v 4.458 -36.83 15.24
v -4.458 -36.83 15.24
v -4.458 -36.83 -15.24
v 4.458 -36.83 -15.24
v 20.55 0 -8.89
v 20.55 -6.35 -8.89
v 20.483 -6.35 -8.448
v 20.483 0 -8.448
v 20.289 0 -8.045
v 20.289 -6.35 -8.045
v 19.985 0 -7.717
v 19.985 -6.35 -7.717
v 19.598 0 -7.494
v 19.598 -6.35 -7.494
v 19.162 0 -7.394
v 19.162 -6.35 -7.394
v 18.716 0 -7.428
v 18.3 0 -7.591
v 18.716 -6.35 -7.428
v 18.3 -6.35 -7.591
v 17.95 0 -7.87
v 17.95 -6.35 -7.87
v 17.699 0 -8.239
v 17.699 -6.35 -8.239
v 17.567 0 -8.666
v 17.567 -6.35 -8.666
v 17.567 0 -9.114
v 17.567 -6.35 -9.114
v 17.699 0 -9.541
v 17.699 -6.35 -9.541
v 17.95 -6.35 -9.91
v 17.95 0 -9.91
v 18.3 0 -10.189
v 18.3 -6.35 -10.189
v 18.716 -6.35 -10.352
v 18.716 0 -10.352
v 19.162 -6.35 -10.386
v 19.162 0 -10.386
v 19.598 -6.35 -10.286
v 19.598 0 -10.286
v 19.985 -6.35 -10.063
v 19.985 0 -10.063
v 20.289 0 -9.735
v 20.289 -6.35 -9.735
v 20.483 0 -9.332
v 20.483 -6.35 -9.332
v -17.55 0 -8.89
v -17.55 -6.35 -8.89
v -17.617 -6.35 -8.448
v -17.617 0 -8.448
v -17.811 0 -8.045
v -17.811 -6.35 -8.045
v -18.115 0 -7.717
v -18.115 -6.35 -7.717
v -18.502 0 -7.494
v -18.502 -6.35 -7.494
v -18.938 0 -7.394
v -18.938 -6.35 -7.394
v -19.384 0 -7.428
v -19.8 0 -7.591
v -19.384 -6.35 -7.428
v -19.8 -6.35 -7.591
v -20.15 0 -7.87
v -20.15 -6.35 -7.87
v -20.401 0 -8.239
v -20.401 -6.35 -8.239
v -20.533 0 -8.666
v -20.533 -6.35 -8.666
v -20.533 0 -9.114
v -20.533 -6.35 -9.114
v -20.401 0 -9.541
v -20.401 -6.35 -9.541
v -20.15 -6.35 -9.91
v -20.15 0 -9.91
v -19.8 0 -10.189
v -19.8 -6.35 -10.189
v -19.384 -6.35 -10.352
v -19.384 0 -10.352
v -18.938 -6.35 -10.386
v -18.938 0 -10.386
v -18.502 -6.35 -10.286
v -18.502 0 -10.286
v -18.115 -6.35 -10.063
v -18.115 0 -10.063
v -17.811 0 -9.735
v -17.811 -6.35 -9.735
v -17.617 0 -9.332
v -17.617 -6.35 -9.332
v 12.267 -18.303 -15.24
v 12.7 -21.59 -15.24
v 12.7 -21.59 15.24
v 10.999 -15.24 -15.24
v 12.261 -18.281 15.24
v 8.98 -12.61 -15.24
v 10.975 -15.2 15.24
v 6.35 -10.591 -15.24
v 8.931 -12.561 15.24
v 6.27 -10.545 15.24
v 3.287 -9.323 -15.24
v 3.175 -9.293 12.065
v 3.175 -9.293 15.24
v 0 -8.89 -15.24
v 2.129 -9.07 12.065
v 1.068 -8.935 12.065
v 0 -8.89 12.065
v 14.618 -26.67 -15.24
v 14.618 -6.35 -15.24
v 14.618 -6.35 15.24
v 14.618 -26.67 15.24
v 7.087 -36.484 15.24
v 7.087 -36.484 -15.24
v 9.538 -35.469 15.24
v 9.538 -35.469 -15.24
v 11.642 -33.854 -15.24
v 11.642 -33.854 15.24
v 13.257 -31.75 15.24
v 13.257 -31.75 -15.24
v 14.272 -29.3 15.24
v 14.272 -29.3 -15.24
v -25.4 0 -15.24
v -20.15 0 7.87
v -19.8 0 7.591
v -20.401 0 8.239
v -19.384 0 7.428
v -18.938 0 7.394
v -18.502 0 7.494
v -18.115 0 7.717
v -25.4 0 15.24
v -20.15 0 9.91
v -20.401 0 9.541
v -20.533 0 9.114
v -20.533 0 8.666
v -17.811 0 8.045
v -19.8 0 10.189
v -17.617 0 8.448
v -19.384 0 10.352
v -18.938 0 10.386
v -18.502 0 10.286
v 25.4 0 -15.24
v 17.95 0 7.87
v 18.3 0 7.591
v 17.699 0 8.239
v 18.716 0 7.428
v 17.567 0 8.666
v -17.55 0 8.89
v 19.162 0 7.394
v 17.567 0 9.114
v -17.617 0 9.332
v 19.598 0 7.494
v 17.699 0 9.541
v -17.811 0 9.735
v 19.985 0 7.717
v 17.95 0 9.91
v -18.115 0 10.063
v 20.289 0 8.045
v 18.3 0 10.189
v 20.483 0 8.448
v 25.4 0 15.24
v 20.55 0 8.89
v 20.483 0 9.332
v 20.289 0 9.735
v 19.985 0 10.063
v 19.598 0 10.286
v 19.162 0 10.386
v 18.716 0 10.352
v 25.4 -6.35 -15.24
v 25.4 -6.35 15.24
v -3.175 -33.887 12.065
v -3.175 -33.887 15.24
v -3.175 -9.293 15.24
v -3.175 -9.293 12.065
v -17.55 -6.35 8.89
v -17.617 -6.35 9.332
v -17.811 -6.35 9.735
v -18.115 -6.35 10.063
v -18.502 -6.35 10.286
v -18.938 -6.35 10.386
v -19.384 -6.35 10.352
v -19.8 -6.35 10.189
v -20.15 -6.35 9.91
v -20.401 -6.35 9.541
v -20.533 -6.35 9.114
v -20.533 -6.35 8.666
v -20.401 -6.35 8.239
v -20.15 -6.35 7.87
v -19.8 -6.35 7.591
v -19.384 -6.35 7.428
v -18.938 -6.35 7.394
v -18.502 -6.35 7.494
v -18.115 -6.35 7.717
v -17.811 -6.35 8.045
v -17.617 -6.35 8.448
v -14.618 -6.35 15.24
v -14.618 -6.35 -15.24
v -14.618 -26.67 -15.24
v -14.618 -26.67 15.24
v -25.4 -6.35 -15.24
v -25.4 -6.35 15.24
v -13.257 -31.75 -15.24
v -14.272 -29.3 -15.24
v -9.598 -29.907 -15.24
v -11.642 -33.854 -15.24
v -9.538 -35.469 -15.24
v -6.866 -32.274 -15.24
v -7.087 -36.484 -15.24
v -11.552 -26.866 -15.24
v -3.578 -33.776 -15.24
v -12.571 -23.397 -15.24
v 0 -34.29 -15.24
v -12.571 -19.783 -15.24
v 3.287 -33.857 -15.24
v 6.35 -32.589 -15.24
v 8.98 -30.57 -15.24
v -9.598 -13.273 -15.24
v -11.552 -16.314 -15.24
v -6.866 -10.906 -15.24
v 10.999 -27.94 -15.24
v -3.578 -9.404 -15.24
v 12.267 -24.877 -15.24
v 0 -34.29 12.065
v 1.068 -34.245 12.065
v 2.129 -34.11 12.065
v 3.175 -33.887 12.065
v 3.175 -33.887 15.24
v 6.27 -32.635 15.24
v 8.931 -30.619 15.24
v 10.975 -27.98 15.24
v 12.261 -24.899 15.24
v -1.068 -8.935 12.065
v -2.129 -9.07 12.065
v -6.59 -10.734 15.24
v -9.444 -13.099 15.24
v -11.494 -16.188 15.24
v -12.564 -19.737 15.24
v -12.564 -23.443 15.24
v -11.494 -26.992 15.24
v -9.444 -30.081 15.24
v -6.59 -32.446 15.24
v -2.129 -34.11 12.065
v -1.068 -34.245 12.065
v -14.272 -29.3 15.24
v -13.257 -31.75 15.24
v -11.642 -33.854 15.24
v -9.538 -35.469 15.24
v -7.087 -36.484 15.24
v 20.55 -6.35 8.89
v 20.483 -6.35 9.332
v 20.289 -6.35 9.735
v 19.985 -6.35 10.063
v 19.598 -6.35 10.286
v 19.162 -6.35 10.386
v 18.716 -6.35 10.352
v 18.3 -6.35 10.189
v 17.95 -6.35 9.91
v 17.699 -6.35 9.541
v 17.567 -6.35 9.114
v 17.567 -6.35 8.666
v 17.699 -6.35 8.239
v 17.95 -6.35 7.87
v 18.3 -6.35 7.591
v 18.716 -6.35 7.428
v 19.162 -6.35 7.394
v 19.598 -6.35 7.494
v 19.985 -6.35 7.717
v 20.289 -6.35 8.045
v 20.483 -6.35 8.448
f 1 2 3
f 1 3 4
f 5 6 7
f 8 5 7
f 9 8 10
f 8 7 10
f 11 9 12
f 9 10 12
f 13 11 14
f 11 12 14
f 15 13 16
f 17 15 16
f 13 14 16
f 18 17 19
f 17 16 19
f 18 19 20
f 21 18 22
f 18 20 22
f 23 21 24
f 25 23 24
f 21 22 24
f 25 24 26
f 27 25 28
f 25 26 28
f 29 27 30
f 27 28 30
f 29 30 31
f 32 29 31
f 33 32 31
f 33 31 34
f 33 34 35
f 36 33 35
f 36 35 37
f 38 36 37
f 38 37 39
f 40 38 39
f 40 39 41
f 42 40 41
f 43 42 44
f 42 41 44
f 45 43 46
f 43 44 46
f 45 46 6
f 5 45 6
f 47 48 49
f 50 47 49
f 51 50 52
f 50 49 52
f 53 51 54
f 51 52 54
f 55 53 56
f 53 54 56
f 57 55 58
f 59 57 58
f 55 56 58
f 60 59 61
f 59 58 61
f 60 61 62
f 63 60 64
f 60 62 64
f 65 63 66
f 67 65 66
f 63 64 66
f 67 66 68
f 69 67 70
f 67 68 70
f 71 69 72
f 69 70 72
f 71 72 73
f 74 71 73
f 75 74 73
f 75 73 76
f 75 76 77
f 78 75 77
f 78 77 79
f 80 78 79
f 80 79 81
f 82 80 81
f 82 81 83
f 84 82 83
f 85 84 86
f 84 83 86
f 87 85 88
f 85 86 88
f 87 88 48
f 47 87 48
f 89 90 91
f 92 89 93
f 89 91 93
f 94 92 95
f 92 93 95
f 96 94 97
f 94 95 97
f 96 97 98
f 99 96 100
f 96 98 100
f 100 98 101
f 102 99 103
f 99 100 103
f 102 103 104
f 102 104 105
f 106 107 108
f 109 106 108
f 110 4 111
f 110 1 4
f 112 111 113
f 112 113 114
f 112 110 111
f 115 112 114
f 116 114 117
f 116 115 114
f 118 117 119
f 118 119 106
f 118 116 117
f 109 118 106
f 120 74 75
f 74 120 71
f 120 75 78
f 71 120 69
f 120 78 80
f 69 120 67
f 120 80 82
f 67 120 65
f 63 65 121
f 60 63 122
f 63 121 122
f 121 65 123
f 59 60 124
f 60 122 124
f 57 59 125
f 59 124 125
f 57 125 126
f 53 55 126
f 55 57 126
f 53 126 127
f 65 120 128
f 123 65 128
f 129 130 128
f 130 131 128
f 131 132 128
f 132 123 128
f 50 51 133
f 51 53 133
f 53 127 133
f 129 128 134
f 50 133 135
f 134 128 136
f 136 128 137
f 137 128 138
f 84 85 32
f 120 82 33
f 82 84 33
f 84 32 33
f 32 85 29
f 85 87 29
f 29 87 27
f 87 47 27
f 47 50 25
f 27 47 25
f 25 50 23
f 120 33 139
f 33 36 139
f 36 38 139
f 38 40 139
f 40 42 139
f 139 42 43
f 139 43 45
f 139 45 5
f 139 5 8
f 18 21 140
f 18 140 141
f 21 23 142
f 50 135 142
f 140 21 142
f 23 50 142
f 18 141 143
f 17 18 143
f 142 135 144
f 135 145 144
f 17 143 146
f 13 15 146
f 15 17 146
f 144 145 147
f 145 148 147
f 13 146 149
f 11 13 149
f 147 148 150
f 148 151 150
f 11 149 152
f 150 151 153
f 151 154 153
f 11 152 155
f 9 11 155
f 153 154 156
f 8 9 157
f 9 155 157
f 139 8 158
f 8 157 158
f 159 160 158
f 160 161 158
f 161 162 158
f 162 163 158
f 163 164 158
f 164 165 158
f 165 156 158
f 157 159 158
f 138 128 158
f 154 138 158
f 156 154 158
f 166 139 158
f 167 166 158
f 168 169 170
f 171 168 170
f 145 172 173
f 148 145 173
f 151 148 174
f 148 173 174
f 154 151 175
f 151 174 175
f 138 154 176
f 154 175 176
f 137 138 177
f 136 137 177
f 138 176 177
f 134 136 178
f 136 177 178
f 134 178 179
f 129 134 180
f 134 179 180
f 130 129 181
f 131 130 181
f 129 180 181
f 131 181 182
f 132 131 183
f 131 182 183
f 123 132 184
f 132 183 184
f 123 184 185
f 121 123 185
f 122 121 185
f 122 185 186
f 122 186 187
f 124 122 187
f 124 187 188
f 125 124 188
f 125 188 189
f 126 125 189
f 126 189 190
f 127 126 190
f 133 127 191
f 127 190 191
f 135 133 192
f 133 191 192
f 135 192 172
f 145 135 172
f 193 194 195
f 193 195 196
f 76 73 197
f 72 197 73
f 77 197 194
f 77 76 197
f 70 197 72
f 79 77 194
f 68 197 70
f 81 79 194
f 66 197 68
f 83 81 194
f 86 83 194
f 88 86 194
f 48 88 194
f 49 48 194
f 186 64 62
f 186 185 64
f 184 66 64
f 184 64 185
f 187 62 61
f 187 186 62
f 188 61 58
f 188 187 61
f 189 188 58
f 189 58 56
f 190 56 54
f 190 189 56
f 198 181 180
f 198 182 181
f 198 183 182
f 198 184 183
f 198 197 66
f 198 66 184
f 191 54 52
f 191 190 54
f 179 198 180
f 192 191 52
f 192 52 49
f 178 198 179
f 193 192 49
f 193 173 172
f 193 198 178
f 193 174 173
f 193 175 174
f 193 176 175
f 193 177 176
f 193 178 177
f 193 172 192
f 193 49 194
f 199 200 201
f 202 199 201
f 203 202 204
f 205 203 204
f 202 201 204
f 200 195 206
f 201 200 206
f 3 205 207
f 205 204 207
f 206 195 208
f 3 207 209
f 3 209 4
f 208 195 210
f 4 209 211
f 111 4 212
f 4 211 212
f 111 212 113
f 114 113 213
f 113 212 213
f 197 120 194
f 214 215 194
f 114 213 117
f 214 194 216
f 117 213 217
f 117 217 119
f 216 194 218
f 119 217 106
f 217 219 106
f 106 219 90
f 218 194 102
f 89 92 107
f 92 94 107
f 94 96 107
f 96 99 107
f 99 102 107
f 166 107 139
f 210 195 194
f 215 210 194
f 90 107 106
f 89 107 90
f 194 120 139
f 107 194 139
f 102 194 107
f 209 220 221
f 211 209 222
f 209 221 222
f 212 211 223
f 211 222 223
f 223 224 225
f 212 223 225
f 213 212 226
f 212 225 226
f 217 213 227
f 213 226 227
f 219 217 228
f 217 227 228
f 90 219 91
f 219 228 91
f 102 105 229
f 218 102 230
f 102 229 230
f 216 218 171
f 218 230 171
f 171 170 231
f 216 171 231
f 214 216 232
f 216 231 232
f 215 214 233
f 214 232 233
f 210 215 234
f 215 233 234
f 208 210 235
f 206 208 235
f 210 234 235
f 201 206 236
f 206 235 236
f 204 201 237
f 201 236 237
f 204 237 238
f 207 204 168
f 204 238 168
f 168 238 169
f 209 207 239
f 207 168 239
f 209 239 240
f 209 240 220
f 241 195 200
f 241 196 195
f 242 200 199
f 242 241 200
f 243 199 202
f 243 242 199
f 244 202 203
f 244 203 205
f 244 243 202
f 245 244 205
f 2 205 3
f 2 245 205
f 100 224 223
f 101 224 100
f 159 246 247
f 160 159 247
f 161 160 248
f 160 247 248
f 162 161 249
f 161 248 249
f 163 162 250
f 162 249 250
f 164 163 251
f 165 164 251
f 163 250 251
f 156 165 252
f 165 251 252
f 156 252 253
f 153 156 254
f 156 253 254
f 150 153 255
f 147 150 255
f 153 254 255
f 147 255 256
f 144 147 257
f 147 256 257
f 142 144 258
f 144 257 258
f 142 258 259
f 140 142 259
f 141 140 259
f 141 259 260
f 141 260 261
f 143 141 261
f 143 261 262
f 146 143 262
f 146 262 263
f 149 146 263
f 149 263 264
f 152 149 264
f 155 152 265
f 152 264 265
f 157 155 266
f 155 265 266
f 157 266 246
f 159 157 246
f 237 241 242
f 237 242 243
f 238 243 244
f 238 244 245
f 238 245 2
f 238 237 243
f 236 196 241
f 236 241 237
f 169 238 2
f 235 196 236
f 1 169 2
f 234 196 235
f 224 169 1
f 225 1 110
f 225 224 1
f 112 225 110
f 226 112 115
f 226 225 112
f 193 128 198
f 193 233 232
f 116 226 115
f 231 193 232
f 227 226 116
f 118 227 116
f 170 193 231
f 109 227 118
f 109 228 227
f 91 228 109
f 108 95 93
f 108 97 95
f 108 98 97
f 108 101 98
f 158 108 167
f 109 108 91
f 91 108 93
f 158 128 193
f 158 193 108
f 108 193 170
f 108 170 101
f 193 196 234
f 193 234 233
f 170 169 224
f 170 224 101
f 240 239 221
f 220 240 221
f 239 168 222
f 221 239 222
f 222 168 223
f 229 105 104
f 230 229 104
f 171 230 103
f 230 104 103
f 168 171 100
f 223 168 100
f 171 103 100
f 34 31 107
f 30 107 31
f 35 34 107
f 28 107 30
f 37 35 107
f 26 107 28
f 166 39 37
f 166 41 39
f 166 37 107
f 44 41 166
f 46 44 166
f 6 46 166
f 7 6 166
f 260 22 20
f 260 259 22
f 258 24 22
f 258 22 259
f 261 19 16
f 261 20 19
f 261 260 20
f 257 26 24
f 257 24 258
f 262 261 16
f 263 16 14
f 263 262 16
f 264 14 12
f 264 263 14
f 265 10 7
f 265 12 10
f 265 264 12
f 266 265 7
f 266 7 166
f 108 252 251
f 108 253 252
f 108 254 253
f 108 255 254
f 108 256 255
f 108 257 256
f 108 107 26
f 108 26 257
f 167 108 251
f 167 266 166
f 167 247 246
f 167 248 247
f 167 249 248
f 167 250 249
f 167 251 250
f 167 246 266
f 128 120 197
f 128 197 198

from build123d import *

# Parameters (mm, degrees)
F0_W      = 50.8
F0_H      = 30.48
F1_DEPTH  = 6.35
F2_R      = 1.5
F3_DEPTH  = 6.35
F4_W      = 29.2354
F4_H      = 30.48
F5_DEPTH  = 30.48
F7_DEPTH  = 30.48
F8_R      = 10.16
F9_W      = 6.35
F9_H      = 36.83
F10_DEPTH = 3.175


with BuildPart() as f1:
    # F0 (on Front) → F1 (new body)
    with BuildSketch(Plane.XZ):
        Rectangle(F0_W, F0_H)
    extrude(amount=F1_DEPTH)

    # F2 (on face) → F3 (cut, through all)
    with BuildSketch(Plane.XZ.offset(6.35)):
        with Locations((-19.05, 8.89)):
            Circle(F2_R)
        with Locations((-19.05, -8.89)):
            Circle(F2_R)
        with Locations((19.05, 8.89)):
            Circle(F2_R)
        with Locations((19.05, -8.89)):
            Circle(F2_R)
    extrude(amount=-F3_DEPTH, mode=Mode.SUBTRACT)

    # F4 (on face) → F5 (join)
    with BuildSketch(Plane.XZ.offset(6.35)):
        Rectangle(F4_W, F4_H)
    extrude(amount=F5_DEPTH)

    # F6 (on face) → F7 (cut, through all)
    with BuildSketch(Plane.XY.offset(15.24)):
        with BuildLine():
            ThreePointArc((12.7, -21.59), (8.980256, -12.609744), (0, -8.89))
            Line((0, -8.89), (0, -34.29))
            ThreePointArc((0, -34.29), (8.980256, -30.570256), (12.7, -21.59))
        make_face()
        with BuildLine():
            Line((0, -34.29), (0, -8.89))
            ThreePointArc((0, -8.89), (-12.7, -21.59), (0, -34.29))
        make_face()
    extrude(amount=-F7_DEPTH, mode=Mode.SUBTRACT)

    # F8
    f8_edges = [f1.edges().sort_by_distance(p)[0] for p in [
        (-14.6177, -36.83, 0),
        (14.6177, -36.83, 0),
    ]]
    fillet(f8_edges, radius=F8_R)

    # F9 (on face) → F10 (join)
    with BuildSketch(Plane.XY.offset(15.24)):
        with Locations((0, -18.415)):
            Rectangle(F9_W, F9_H)
    extrude(amount=-F10_DEPTH)


solid = f1.part
